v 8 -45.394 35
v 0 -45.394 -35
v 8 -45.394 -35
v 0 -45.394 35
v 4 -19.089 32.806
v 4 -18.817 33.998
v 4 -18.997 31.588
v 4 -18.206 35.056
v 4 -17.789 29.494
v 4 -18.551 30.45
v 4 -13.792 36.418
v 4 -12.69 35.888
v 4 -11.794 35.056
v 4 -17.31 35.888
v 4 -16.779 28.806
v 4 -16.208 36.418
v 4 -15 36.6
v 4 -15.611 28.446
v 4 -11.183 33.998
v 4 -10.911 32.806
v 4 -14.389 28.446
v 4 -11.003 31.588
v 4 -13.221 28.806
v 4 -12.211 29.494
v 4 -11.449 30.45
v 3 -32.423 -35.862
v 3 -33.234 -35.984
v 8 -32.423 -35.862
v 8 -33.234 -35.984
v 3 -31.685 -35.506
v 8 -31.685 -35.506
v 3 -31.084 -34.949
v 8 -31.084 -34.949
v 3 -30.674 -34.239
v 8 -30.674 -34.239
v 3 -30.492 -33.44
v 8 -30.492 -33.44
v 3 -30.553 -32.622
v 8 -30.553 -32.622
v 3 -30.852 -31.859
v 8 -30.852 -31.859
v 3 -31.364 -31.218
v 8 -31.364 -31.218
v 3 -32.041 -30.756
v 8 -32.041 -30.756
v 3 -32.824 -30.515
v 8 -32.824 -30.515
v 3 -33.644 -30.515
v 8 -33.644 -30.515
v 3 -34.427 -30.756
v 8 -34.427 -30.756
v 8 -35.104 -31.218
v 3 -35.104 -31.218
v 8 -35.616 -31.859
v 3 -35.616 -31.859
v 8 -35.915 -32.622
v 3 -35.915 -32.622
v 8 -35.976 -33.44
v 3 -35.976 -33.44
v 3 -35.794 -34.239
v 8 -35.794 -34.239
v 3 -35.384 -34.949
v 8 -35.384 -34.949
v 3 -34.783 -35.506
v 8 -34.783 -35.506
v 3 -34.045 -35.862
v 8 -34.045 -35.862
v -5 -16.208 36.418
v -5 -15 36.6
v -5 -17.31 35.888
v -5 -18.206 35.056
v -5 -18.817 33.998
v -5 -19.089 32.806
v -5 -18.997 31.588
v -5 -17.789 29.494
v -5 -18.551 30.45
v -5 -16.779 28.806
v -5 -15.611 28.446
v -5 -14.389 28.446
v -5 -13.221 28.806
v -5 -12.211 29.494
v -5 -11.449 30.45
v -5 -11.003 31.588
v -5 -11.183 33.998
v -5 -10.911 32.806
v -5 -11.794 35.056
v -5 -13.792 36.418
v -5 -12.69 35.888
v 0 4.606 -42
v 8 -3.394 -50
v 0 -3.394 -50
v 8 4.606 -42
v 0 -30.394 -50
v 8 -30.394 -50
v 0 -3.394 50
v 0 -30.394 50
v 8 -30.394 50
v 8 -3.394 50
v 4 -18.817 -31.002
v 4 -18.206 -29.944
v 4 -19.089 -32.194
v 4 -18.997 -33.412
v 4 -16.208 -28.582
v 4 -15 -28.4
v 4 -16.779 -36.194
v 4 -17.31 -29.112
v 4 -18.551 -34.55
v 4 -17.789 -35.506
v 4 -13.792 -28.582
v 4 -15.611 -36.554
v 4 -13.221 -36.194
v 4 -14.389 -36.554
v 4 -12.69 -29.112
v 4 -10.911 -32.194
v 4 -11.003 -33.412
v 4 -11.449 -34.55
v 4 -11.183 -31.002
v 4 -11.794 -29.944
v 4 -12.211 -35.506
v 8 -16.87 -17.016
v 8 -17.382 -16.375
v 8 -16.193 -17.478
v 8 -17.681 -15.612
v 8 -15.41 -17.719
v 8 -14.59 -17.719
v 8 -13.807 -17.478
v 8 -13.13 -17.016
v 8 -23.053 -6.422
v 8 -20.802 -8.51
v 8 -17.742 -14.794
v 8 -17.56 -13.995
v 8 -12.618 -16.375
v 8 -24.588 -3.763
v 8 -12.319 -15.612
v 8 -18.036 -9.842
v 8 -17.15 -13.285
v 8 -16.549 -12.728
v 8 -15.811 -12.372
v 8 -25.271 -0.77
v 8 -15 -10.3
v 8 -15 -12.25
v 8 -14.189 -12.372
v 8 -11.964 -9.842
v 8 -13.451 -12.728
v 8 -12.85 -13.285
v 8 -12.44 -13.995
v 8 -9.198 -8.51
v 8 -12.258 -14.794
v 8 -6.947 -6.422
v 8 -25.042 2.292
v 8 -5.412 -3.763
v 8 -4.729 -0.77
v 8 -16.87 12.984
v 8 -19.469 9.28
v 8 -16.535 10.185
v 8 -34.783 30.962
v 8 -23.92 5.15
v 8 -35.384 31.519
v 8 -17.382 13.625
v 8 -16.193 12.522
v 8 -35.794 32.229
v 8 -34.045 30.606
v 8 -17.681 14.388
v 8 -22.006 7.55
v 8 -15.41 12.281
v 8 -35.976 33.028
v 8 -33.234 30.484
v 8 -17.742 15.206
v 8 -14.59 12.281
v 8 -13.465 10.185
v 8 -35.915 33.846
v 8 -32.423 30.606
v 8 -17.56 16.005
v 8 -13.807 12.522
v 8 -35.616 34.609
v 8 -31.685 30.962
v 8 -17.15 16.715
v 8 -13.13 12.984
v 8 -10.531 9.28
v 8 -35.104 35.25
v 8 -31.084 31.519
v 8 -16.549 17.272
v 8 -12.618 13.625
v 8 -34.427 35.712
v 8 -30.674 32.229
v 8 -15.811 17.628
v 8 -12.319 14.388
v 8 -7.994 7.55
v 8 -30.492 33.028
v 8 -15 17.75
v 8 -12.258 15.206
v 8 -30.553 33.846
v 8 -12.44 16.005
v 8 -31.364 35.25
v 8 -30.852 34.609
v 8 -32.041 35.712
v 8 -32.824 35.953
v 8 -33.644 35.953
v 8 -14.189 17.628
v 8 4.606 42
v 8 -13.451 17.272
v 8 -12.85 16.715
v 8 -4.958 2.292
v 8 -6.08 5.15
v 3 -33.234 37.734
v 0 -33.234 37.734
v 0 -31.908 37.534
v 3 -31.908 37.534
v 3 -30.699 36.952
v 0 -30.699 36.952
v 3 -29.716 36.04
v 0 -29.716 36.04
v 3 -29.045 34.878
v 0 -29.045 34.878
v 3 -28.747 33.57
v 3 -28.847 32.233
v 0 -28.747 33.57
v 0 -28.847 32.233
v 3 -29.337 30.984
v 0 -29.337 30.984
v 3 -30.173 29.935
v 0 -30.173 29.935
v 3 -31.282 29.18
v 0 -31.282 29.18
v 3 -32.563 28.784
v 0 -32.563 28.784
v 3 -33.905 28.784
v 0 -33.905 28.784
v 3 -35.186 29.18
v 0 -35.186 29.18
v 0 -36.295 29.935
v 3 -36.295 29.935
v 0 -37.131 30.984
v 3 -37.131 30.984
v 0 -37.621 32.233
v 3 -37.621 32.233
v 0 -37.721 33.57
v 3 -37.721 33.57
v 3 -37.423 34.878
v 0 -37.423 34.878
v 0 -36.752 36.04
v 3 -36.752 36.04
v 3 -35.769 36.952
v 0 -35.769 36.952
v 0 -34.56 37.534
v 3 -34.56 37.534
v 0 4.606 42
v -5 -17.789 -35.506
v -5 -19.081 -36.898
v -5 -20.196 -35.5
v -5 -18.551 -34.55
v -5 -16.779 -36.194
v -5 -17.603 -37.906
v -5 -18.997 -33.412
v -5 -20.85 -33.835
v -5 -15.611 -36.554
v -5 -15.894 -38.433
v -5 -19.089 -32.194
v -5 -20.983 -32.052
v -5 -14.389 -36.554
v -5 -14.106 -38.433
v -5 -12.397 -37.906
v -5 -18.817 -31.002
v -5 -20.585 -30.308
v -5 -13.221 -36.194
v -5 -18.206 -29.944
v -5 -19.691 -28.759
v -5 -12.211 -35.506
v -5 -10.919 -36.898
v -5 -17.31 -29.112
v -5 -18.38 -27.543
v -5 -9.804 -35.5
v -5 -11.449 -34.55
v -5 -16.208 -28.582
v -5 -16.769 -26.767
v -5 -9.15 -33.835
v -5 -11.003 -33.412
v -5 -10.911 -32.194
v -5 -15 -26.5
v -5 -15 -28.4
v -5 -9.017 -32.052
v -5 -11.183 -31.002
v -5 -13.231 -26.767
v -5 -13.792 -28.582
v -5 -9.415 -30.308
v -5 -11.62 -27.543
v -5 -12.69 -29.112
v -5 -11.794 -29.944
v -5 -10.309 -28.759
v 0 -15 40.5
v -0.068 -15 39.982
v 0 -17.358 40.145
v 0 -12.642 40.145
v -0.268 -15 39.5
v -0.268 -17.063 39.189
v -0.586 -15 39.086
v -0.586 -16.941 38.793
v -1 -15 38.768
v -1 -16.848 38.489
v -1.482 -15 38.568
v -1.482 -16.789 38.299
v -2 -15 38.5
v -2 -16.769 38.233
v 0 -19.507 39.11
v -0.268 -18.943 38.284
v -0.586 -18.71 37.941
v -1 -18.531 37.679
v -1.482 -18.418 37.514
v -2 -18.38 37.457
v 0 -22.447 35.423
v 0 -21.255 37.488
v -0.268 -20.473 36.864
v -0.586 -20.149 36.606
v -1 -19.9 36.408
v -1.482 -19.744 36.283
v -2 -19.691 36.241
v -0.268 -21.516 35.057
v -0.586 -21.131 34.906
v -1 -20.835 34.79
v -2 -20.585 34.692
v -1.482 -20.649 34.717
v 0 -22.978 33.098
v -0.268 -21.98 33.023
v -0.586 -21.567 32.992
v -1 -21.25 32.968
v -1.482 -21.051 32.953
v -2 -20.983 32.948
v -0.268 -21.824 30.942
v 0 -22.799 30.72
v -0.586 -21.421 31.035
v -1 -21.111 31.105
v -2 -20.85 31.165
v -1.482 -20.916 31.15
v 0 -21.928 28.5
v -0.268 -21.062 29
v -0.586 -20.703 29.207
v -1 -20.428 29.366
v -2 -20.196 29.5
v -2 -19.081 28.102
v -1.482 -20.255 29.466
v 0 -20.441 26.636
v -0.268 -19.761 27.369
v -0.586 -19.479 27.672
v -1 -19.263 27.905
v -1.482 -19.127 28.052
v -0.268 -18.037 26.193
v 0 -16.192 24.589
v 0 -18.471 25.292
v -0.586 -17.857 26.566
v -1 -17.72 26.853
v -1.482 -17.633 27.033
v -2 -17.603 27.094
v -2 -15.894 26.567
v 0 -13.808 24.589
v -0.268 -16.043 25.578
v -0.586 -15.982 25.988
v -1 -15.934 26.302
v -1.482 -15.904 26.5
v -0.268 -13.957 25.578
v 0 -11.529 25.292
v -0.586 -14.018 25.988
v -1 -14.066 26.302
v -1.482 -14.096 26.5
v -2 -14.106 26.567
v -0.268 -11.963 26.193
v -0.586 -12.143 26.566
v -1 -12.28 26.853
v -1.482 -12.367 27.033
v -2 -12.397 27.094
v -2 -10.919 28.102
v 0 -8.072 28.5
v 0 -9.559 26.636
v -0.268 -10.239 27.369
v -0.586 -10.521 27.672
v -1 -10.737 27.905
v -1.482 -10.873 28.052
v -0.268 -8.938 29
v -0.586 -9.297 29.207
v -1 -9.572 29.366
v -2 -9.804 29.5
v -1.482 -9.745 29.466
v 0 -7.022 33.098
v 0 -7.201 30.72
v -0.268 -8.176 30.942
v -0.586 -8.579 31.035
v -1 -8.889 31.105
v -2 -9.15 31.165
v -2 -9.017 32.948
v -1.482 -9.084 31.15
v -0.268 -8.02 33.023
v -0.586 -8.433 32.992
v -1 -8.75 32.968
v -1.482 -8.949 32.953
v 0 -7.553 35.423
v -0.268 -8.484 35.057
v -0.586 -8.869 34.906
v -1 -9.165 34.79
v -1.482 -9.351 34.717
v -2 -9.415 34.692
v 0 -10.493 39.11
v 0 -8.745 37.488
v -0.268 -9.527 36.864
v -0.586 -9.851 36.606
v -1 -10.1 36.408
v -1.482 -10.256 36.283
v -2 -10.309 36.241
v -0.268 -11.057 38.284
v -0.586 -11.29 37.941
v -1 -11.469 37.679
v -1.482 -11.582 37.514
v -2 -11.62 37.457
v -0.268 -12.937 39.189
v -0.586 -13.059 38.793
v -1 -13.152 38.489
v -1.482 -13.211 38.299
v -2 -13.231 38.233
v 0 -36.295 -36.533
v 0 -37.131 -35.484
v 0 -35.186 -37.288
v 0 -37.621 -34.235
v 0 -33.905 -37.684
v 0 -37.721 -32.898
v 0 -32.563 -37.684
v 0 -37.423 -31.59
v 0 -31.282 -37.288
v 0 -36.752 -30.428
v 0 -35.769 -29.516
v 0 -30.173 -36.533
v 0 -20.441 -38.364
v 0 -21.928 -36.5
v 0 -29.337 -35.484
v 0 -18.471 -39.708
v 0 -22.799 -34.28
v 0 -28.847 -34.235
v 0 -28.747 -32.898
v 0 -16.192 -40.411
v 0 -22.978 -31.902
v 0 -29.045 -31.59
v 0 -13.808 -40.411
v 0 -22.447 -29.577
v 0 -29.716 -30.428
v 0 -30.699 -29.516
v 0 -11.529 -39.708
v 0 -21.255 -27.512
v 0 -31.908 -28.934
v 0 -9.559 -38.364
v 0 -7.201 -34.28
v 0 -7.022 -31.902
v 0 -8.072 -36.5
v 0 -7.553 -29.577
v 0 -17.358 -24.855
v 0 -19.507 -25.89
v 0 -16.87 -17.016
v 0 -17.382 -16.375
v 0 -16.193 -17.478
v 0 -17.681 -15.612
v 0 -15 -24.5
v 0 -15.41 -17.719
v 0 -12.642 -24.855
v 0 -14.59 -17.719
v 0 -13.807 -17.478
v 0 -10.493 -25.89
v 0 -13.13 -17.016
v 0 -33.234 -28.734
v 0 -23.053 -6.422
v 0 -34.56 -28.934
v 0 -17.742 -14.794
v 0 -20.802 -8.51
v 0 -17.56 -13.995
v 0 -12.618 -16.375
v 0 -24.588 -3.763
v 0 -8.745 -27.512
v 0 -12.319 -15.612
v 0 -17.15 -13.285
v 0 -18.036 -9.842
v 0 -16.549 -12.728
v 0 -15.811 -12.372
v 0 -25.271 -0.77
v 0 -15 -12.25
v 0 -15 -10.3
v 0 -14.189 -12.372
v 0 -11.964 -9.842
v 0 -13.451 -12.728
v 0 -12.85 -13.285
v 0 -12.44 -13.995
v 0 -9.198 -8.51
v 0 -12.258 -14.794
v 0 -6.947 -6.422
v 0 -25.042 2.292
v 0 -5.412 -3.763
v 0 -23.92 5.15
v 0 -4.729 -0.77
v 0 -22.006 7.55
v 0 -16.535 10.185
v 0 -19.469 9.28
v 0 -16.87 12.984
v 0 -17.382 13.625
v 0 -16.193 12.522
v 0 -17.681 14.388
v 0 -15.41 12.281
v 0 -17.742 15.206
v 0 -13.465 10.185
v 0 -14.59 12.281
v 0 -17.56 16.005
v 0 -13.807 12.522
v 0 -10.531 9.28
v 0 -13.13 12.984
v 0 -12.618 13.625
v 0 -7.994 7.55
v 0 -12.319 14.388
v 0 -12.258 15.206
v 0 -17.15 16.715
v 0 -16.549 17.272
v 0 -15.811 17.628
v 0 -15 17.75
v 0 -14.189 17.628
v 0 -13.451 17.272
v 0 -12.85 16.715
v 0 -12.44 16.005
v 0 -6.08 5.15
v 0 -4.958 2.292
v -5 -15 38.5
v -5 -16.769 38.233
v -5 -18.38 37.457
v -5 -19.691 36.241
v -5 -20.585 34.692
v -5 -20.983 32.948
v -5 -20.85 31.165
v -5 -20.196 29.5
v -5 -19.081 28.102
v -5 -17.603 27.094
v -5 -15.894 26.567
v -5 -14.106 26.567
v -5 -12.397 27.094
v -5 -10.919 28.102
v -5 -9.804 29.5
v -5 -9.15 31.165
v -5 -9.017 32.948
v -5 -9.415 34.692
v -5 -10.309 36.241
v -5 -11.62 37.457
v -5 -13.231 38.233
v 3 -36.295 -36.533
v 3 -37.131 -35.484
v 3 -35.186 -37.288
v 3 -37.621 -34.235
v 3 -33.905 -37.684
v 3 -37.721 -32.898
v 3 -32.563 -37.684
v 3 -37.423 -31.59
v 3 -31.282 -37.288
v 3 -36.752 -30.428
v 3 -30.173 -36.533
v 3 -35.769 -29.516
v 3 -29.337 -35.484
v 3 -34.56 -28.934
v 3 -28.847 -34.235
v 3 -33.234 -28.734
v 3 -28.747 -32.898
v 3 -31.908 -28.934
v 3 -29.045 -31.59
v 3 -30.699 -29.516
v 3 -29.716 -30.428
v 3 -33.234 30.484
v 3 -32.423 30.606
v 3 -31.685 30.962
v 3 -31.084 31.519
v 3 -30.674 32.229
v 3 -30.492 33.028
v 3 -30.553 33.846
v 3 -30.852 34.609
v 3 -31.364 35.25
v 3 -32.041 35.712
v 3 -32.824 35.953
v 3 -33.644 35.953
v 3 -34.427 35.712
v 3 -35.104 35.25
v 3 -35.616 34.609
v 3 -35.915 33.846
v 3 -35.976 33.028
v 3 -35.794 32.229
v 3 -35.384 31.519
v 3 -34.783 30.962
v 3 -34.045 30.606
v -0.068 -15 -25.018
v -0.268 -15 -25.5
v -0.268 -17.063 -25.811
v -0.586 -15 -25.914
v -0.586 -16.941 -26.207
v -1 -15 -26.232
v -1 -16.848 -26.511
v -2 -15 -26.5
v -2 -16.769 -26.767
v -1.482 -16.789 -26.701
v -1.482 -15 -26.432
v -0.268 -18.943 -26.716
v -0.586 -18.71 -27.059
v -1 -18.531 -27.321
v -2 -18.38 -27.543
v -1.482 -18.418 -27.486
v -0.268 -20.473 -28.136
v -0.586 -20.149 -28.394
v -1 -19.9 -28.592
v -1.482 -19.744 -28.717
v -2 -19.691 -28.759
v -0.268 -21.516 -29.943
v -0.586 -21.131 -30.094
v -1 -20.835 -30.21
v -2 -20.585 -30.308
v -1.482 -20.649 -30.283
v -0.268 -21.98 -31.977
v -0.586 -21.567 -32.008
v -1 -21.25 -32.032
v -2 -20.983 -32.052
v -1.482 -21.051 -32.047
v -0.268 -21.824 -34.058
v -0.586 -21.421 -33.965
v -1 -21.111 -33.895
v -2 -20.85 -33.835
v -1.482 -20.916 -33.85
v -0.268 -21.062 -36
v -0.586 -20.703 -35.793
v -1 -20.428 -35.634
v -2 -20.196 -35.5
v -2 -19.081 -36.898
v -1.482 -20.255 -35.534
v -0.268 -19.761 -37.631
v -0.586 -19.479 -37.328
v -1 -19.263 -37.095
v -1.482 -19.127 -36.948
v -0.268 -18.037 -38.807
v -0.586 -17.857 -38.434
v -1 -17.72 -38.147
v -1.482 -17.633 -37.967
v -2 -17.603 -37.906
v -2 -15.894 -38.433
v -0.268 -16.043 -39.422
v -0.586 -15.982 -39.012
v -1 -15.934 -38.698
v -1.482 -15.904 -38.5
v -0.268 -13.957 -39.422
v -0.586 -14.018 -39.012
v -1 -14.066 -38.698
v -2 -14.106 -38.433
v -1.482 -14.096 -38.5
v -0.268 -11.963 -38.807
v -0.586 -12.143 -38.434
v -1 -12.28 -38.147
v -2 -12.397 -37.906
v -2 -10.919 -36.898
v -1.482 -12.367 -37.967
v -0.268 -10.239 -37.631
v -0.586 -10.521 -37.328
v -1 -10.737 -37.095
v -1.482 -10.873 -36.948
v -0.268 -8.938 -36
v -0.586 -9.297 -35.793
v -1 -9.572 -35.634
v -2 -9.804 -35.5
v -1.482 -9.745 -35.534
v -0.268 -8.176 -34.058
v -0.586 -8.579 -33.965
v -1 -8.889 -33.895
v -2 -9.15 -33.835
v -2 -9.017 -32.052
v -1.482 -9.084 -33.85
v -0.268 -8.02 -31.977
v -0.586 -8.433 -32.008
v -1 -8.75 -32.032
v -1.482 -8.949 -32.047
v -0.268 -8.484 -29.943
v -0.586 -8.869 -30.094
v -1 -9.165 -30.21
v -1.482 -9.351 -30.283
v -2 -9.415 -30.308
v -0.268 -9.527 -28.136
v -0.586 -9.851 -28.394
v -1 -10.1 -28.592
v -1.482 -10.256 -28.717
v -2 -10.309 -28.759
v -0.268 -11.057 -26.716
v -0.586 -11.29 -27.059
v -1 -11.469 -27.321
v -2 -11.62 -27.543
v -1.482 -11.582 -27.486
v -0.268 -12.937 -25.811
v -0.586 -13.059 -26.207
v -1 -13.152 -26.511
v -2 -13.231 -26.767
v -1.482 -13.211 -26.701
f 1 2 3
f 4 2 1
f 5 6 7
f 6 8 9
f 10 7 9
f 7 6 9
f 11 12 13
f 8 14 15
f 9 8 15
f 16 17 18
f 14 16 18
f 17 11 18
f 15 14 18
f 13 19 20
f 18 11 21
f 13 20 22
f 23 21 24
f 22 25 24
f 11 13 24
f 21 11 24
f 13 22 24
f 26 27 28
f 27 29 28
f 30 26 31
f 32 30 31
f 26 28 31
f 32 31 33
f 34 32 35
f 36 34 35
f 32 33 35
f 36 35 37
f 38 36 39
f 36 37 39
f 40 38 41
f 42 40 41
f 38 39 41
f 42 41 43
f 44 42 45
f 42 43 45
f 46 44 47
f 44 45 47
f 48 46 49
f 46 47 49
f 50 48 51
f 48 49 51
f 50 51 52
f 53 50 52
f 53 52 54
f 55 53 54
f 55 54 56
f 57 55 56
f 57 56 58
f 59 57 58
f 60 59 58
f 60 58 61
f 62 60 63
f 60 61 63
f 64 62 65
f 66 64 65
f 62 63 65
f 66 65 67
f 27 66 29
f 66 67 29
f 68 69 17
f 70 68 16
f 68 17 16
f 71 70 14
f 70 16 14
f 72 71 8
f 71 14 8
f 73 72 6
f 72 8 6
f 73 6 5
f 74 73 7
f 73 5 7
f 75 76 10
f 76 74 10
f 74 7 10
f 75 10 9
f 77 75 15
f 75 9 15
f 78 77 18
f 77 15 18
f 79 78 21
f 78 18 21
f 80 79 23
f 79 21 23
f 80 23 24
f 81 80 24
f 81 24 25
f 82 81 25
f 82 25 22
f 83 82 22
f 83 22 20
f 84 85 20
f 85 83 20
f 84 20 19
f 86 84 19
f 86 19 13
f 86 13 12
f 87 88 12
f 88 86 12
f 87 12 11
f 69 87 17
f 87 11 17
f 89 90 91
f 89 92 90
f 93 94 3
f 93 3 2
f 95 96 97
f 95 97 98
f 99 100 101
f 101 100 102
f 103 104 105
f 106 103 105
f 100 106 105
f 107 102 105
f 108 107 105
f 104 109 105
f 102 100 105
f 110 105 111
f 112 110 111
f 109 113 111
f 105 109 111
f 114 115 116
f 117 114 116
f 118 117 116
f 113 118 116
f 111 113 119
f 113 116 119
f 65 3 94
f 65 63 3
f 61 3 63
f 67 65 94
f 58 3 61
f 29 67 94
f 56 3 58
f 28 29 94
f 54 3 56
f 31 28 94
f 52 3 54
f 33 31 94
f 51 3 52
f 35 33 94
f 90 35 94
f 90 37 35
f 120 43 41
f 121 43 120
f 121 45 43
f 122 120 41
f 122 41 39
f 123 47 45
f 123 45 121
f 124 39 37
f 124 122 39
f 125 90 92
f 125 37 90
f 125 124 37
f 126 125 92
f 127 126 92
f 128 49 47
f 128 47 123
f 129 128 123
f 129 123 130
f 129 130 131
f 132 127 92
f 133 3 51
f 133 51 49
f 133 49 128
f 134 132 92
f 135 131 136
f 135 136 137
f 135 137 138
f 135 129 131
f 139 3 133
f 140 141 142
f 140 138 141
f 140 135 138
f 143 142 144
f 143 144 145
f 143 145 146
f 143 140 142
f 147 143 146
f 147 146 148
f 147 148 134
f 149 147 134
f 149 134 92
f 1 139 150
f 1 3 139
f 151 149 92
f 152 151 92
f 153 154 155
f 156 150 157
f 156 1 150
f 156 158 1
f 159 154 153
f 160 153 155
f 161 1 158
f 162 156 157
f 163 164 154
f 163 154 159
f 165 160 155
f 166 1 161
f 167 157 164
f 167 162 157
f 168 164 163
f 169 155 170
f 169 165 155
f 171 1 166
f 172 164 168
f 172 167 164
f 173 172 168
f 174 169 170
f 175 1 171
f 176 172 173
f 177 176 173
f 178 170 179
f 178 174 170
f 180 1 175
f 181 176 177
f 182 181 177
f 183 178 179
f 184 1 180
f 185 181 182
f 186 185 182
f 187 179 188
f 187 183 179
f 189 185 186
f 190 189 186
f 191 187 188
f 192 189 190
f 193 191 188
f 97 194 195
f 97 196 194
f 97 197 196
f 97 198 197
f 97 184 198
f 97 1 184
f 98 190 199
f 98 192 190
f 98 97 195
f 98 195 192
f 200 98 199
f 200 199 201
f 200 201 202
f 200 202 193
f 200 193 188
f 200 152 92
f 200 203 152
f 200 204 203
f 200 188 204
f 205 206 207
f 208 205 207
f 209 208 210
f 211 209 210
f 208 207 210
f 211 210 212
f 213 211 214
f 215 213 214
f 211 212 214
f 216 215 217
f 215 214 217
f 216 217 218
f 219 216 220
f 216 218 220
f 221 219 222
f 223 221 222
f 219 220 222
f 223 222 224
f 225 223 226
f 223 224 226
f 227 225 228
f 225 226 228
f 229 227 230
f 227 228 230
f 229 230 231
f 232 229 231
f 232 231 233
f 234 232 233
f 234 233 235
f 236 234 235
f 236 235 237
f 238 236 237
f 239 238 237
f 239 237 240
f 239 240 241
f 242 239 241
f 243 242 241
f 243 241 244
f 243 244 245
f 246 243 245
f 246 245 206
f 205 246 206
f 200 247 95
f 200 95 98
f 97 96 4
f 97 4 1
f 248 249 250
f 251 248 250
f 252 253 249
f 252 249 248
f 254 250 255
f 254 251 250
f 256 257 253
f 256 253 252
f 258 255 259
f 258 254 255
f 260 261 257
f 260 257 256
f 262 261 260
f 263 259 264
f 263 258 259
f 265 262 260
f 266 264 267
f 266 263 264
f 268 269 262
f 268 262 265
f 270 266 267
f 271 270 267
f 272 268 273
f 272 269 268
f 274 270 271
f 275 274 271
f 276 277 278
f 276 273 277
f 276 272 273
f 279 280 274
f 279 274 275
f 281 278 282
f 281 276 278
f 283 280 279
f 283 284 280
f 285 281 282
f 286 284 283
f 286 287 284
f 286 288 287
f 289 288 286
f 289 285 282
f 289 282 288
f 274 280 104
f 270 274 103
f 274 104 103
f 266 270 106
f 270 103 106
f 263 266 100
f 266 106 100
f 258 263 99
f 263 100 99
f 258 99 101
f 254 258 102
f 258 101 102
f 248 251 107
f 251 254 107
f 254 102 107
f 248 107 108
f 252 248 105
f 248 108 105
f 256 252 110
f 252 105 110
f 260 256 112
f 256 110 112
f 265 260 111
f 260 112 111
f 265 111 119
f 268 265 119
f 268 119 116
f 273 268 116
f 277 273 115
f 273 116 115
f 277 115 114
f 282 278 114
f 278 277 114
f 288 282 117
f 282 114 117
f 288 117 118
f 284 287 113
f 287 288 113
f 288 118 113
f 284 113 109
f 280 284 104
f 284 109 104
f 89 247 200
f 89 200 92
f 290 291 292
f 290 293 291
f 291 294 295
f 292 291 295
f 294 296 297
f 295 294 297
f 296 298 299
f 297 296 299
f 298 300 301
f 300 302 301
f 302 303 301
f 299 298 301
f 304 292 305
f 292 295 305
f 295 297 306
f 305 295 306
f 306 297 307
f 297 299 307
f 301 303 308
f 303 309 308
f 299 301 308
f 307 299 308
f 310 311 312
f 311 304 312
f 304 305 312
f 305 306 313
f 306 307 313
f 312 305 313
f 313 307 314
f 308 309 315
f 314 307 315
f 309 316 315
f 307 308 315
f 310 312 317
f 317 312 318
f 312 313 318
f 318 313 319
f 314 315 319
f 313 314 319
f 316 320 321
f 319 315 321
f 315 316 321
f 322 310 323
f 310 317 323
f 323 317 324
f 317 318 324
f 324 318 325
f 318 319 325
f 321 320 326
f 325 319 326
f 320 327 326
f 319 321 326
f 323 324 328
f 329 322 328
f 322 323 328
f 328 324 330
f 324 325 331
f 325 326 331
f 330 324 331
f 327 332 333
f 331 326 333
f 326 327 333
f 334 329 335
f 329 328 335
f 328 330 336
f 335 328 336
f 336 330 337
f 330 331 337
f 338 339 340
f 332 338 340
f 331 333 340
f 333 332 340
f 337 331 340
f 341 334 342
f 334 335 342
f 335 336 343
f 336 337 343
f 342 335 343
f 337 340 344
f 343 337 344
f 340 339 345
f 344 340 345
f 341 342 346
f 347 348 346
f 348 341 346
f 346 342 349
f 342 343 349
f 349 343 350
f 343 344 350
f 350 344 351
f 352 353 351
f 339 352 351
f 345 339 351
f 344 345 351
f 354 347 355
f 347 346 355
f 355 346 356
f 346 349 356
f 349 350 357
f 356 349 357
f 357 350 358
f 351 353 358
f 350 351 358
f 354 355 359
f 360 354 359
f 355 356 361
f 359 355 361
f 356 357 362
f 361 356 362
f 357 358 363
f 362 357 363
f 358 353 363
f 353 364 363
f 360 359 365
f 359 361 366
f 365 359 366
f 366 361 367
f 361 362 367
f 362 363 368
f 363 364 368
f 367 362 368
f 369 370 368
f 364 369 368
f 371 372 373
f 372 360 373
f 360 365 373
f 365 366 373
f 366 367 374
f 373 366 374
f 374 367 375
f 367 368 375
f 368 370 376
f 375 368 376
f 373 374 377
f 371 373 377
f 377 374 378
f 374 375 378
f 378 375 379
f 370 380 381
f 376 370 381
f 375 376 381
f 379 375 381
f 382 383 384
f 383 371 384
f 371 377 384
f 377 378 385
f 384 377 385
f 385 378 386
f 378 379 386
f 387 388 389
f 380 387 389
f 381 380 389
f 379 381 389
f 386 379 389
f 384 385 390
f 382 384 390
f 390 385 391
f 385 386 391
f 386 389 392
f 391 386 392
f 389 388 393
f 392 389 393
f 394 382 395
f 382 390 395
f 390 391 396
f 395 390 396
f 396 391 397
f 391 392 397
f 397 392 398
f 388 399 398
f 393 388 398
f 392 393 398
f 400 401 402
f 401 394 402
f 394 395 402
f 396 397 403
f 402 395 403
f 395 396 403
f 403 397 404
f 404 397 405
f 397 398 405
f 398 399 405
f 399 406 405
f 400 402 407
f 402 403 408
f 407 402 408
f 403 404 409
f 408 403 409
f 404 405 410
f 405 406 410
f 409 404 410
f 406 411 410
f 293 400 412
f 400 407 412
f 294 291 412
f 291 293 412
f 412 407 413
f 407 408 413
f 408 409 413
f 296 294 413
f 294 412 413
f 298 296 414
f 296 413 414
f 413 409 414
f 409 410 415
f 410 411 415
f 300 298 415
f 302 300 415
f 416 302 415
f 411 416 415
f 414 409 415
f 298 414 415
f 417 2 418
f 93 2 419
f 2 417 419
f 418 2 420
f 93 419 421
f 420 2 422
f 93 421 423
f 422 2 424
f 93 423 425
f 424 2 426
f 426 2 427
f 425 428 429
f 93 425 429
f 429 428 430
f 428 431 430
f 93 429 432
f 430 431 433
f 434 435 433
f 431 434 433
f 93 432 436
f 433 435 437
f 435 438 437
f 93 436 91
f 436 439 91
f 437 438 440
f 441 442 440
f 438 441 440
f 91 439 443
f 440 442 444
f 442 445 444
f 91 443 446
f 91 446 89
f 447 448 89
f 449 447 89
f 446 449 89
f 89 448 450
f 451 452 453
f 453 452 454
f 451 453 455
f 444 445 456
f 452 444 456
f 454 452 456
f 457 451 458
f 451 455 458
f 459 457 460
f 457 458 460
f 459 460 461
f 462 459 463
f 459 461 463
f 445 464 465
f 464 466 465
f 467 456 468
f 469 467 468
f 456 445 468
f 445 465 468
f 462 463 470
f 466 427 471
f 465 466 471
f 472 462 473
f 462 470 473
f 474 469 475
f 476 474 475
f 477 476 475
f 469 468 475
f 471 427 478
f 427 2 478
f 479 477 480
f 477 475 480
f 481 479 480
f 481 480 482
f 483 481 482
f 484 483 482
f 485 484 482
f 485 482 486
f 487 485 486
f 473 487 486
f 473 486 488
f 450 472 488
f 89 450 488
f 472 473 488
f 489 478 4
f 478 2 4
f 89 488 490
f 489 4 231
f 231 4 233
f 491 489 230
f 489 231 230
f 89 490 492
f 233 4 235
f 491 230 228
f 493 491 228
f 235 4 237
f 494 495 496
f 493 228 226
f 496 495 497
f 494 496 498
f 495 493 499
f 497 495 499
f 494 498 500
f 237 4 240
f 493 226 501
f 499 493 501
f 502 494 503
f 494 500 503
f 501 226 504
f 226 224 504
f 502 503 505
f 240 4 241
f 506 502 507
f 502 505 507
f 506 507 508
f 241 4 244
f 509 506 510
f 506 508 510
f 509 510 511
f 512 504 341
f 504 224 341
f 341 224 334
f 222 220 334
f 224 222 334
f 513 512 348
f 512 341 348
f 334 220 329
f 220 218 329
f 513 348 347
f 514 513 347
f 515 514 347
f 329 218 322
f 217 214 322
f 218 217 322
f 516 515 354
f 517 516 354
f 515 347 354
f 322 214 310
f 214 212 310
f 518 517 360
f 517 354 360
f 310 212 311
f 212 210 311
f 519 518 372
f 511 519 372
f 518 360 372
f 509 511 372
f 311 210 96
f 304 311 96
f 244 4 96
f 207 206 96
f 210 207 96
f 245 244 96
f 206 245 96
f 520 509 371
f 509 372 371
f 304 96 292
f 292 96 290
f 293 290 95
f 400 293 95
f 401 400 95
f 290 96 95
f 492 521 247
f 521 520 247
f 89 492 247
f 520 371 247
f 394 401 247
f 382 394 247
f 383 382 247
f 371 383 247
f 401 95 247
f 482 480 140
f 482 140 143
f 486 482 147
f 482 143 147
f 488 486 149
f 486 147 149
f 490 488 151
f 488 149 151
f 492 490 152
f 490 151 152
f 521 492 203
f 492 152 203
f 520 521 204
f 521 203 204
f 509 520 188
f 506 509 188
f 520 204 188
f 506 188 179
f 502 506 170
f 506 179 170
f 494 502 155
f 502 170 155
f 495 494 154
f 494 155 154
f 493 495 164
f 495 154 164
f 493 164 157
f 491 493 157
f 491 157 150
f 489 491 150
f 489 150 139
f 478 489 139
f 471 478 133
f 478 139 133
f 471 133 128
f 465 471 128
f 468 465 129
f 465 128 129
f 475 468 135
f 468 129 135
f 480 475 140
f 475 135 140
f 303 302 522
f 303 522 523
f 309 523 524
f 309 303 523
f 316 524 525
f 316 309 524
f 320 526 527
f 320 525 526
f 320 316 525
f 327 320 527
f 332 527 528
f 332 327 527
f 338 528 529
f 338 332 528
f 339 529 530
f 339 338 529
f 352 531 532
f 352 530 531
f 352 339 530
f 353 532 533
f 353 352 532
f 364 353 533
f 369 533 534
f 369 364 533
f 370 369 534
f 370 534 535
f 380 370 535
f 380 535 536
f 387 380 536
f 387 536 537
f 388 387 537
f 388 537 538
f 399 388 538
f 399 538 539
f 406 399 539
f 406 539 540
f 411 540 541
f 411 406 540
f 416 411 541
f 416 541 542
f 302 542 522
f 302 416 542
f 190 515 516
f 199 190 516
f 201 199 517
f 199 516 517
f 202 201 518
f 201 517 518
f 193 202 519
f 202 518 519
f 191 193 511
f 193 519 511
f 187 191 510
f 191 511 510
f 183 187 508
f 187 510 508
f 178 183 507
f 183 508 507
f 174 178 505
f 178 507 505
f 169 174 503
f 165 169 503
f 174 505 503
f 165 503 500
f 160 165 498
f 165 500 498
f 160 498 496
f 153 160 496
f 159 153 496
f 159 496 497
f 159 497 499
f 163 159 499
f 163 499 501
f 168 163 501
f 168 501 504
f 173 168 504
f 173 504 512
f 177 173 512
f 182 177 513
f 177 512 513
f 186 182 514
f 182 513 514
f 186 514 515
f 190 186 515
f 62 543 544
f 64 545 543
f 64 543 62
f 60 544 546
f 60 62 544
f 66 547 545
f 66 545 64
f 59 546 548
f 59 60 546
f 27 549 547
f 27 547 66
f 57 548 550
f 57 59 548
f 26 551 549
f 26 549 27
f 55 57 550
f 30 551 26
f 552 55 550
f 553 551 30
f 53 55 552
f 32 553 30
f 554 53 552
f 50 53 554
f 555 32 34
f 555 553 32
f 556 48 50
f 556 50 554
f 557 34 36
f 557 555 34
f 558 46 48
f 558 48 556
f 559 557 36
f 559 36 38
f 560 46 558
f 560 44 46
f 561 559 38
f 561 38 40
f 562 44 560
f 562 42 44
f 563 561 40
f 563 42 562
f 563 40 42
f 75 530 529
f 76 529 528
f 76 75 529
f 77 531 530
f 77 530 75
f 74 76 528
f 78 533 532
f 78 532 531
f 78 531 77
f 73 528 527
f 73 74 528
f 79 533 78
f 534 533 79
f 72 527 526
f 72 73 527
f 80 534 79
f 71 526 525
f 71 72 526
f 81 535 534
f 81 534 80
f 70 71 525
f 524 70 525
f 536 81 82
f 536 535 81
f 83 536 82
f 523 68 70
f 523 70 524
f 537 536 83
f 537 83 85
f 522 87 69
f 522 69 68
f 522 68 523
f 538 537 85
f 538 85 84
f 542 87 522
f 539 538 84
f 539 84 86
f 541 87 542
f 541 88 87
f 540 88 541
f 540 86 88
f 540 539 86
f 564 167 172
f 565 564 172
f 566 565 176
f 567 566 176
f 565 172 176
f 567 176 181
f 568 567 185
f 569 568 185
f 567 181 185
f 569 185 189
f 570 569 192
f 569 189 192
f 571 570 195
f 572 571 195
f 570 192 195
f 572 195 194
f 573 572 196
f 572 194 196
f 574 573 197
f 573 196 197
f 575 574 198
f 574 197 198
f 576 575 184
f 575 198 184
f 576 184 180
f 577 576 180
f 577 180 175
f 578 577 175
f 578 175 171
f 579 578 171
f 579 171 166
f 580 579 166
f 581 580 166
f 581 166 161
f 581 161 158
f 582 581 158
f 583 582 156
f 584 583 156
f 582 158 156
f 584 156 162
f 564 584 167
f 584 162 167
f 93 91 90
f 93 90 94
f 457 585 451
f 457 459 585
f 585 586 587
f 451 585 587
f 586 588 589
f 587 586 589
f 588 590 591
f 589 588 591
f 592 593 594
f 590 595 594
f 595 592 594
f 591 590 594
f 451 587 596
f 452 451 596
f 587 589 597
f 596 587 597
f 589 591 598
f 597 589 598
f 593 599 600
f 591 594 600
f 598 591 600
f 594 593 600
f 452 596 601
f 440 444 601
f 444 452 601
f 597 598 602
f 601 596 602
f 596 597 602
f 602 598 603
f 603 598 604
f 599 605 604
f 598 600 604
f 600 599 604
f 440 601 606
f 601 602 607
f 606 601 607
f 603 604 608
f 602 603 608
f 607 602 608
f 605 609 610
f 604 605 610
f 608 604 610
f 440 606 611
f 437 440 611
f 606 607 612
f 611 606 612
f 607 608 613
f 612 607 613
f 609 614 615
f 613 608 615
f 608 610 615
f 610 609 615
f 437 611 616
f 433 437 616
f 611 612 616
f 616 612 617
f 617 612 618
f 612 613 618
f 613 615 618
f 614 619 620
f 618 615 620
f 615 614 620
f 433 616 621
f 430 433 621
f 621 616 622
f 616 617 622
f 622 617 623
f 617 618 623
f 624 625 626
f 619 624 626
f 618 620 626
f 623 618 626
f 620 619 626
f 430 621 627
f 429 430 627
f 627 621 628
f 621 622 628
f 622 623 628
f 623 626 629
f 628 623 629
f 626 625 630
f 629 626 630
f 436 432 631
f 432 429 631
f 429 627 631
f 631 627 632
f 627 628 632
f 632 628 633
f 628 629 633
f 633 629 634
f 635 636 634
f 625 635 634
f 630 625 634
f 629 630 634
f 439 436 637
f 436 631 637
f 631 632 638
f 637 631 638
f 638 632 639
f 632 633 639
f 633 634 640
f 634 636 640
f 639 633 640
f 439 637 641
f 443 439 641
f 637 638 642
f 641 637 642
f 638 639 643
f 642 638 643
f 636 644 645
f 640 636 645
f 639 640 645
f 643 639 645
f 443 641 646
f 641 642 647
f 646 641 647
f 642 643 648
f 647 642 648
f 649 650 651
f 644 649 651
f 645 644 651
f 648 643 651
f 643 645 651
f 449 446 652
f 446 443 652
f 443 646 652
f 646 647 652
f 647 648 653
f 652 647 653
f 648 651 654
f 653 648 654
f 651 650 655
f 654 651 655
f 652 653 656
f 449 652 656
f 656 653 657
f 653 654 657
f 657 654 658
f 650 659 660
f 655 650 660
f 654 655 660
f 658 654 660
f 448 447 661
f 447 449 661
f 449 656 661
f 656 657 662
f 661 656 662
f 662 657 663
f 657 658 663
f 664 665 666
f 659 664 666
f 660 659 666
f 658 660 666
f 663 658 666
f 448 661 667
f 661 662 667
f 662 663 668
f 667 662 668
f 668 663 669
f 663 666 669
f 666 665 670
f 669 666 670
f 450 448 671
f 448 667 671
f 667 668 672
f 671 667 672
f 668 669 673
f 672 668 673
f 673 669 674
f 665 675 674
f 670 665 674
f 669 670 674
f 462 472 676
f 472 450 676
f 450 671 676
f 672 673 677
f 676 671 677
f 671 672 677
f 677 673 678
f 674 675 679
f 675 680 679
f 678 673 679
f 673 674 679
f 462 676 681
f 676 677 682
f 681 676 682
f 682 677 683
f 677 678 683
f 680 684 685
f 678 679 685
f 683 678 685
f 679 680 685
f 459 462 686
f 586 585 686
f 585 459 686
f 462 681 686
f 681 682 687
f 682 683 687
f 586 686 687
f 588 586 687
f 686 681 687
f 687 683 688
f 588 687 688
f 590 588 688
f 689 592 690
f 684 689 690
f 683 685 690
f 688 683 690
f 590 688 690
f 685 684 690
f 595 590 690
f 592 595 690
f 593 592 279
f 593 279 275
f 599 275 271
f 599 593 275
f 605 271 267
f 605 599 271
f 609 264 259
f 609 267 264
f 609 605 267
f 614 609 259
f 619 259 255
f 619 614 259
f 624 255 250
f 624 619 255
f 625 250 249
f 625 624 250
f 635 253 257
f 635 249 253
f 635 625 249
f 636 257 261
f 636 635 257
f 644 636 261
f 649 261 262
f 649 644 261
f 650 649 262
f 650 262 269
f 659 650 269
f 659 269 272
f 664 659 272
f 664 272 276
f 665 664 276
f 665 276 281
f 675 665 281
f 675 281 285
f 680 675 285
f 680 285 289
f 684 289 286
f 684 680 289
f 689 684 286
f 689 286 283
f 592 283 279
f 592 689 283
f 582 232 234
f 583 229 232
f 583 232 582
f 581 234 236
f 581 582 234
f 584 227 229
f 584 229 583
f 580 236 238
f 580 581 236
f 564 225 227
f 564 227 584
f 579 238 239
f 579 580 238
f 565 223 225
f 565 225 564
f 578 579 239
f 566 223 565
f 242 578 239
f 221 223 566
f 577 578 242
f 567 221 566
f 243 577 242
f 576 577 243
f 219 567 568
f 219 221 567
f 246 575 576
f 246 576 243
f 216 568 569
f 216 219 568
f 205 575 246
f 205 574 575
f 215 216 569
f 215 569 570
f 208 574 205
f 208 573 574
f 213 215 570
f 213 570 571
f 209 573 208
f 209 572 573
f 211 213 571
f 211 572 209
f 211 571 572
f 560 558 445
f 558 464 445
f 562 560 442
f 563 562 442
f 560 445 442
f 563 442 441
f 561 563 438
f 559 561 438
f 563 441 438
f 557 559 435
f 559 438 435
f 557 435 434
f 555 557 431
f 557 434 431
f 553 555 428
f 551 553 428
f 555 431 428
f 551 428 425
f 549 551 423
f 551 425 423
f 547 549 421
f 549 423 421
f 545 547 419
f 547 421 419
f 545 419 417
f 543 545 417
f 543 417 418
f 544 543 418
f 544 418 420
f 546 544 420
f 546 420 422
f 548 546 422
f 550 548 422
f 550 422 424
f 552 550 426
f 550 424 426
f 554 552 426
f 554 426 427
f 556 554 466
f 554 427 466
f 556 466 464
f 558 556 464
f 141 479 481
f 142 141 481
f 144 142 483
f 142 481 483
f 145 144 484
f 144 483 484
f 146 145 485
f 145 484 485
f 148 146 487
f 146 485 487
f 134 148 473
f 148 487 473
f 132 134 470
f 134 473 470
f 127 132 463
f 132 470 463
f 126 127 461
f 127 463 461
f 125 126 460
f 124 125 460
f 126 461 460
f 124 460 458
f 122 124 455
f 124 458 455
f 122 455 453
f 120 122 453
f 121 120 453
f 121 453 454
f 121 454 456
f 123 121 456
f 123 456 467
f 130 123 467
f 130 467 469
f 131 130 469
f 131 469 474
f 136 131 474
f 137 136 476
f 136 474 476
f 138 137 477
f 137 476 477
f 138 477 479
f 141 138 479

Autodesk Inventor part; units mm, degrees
ref_plane "YZ Plane" through (0, 0, 0) normal (1, 0, 0) x (0, 1, 0)
ref_plane "XZ Plane" through (0, 0, 0) normal (0, 1, 0) x (-1, 0, 0)
ref_plane "XY Plane" through (0, 0, 0) normal (0, 0, 1) x (1, 0, 0)
sketch "Sketch1" plane through (0, 0, 0) normal (1, 0, 0) x (0, 1, 0)
  line L0 (-55, 110) -> (55, 110)
  line L1 (55, 110) -> (55, -110)
  line L2 (55, -110) -> (-55, -110)
  line L3 (-55, -110) -> (-55, 110)
  line L4 (-55, 110) -> (55, -110) construction
  line L5 (55, 110) -> (-55, -110) construction
  circle A0 centre (-15, 32.5) radius 4.1
  circle A1 centre (-15, -32.5) radius 4.1
  circle A2 centre (-15, 0) radius 5
  line L6 (-15, 32.5) -> (-15, -32.5) construction
  line L7 (48, -103) -> (48, 103)
  line L8 (48, 103) -> (-48, 103)
  line L9 (-48, 103) -> (-48, -103)
  line L10 (-48, -103) -> (48, -103)
  point P0 (0, 0)
  dimension "d0" = 65
  dimension "d1" = 8.2
  dimension "d2" = 220
  dimension "d3" = 110
  dimension "d4" = 7
  dimension "d35" = 10
  dimension "d36" = 15
extrude "Extrusion1" add sketch "Sketch1" along normal blind 8 contours L0 L1 L2 L3 | A0 | A1 | L10 L9 L8 L7
sketch "Sketch2" plane through (8, 0, 0) normal (1, 0, 0) x (0, 0, -1)
  line L0 (110, -55) -> (110, 55) projected
  line L1 (110, 55) -> (-110, 55) projected
  line L2 (-110, 55) -> (-110, -55) projected
  line L3 (-110, -55) -> (110, -55) projected
  line L4 (-33.234, -33.234) -> (33.234, -33.234) construction
  line L5 (33.234, -33.234) -> (33.234, 33.234) construction
  line L6 (33.234, 33.234) -> (-33.234, 33.234) construction
  line L7 (-33.234, 33.234) -> (-33.234, -33.234) construction
  line L8 (-33.234, -33.234) -> (33.234, 33.234) construction
  line L9 (33.234, -33.234) -> (-33.234, 33.234) construction
  circle A0 centre (0, 0) radius 47 construction
  circle A1 centre (33.234, 33.234) radius 2.75
  circle A2 centre (-33.234, 33.234) radius 2.75
  circle A3 centre (0, 0) radius 47 construction
  circle A4 centre (-33.234, -33.234) radius 2.75
  circle A5 centre (0, 0) radius 47 construction
  circle A6 centre (33.234, -33.234) radius 2.75
  circle A7 centre (0, 0) radius 47 construction
  point P0 (0, 0)
  point P1 (0, 0)
  dimension "d12" = 94
  dimension "d13" = 5.5
  dimension "d16" = 360
extrude "Extrusion3" cut sketch "Sketch2" against normal through all contours A1 | A2 | A4 | A6
sketch "Sketch3" plane through (0, 0, 0) normal (-1, 0, 0) x (0, 0, 1)
  circle A0 centre (33.234, -33.234) radius 2.75 projected
  circle A1 centre (33.234, 33.234) radius 2.75 projected
  circle A2 centre (-33.234, -33.234) radius 2.75 projected
  circle A3 centre (-33.234, 33.234) radius 2.75 projected
  circle A4 centre (0, -15) radius 5 projected
  circle A5 centre (-33.234, 33.234) radius 4.5
  circle A6 centre (33.234, 33.234) radius 2.75 projected
  circle A7 centre (33.234, 33.234) radius 4.5
  circle A8 centre (-33.234, -33.234) radius 4.5
  circle A9 centre (33.234, -33.234) radius 4.5
  point P0 (0, 0)
  dimension "d20" = 9
extrude "Extrusion4" cut sketch "Sketch3" against normal blind 3 contours A0 | A1 | A2 | A3 | A5 | A7 | A8 | A9
sketch "Sketch4" plane through (8, 0, 0) normal (1, 0, 0) x (0, 0, -1)
  circle A0 centre (-33.234, -33.234) radius 2.75 projected
  circle A1 centre (-33.234, 33.234) radius 2.75 projected
  circle A2 centre (33.234, -33.234) radius 2.75 projected
  circle A3 centre (33.234, 33.234) radius 2.75 projected
  line L0 (110, -55) -> (110, 55) projected
  line L1 (110, 55) -> (-110, 55) projected
  line L2 (-110, 55) -> (-110, -55) projected
  line L3 (-110, -55) -> (110, -55) projected
  circle A4 centre (0, -15) radius 5 projected
  circle A5 centre (0, -15) radius 10.3
  point P0 (0, 0)
  dimension "d24" = 20.6
extrude "Extrusion5" cut sketch "Sketch4" against normal through all contours A4 | A5
sketch "Sketch7" plane through (0, 0, 0) normal (-1, 0, 0) x (0, 0, 1)
  line L0 (-50, -45.3941) -> (50, -45.3941)
  line L1 (50, -45.3941) -> (50, 4.6059)
  line L2 (50, 4.6059) -> (-50, 4.6059)
  line L3 (-50, 4.6059) -> (-50, -45.3941)
  circle A0 centre (-32.5, -15) radius 4.1 projected
  circle A1 centre (32.5, -15) radius 4.1 projected
  line L4 (-110, -55) -> (-110, 55) projected
  line L5 (-110, 55) -> (110, 55) projected
  line L6 (110, 55) -> (110, -55) projected
  line L7 (110, -55) -> (-110, -55) projected
  point P0 (0, 4.6059)
  point P1 (0, 4.6059)
  point P2 (0, -15)
  dimension "d37" = 50
  dimension "d38" = 100
extrude "Extrusion8" cut sketch "Sketch7" against normal through all
chamfer "Chamfer3" distance 15 angle 45 2 edges at (4, -45.3941, -50) (4, -45.3941, 50)
chamfer "Chamfer4" distance 8 angle 45 2 edges at (4, 4.6059, -50) (4, 4.6059, 50)
sketch "Sketch8" plane through (0, 0, 0) normal (-1, 0, 0) x (0, 0, 1)
  circle A0 centre (-32.5, -15) radius 4.1 projected
  circle A1 centre (32.5, -15) radius 4.1 projected
  circle A2 centre (-32.5, -15) radius 6
  circle A3 centre (32.5, -15) radius 6
  point P0 (0, 0)
  dimension "d47" = 12
extrude "Extrusion9" add sketch "Sketch8" along normal blind 5
sketch "Sketch9" plane through (8, 0, 0) normal (1, 0, 0) x (0, 0, -1)
  circle A0 centre (-32.5, -15) radius 4.1 projected
  circle A1 centre (32.5, -15) radius 4.1 projected
  point P0 (0, 0)
extrude "Extrusion10" add sketch "Sketch9" against normal blind 4
sketch "Sketch10" plane through (0, 0, 0) normal (-1, 0, 0) x (0, 0, 1)
  circle A0 centre (0, -15) radius 10.3 projected
  circle A1 centre (-15, -15) radius 2.75
  circle A2 centre (15, -15) radius 2.75
  line L0 (-15, -15) -> (15, -15) construction
  point P0 (0, 0)
  dimension "d52" = 30
  dimension "d53" = 5.5
extrude "Extrusion11" cut sketch "Sketch10" against normal through all contours A1 | A2
fillet "Fillet2" radius 2 2 edges at (0, -15, -38.5) (0, -15, 26.5)
properties part number "CAJA" material "Steel, Mild, Welded"
